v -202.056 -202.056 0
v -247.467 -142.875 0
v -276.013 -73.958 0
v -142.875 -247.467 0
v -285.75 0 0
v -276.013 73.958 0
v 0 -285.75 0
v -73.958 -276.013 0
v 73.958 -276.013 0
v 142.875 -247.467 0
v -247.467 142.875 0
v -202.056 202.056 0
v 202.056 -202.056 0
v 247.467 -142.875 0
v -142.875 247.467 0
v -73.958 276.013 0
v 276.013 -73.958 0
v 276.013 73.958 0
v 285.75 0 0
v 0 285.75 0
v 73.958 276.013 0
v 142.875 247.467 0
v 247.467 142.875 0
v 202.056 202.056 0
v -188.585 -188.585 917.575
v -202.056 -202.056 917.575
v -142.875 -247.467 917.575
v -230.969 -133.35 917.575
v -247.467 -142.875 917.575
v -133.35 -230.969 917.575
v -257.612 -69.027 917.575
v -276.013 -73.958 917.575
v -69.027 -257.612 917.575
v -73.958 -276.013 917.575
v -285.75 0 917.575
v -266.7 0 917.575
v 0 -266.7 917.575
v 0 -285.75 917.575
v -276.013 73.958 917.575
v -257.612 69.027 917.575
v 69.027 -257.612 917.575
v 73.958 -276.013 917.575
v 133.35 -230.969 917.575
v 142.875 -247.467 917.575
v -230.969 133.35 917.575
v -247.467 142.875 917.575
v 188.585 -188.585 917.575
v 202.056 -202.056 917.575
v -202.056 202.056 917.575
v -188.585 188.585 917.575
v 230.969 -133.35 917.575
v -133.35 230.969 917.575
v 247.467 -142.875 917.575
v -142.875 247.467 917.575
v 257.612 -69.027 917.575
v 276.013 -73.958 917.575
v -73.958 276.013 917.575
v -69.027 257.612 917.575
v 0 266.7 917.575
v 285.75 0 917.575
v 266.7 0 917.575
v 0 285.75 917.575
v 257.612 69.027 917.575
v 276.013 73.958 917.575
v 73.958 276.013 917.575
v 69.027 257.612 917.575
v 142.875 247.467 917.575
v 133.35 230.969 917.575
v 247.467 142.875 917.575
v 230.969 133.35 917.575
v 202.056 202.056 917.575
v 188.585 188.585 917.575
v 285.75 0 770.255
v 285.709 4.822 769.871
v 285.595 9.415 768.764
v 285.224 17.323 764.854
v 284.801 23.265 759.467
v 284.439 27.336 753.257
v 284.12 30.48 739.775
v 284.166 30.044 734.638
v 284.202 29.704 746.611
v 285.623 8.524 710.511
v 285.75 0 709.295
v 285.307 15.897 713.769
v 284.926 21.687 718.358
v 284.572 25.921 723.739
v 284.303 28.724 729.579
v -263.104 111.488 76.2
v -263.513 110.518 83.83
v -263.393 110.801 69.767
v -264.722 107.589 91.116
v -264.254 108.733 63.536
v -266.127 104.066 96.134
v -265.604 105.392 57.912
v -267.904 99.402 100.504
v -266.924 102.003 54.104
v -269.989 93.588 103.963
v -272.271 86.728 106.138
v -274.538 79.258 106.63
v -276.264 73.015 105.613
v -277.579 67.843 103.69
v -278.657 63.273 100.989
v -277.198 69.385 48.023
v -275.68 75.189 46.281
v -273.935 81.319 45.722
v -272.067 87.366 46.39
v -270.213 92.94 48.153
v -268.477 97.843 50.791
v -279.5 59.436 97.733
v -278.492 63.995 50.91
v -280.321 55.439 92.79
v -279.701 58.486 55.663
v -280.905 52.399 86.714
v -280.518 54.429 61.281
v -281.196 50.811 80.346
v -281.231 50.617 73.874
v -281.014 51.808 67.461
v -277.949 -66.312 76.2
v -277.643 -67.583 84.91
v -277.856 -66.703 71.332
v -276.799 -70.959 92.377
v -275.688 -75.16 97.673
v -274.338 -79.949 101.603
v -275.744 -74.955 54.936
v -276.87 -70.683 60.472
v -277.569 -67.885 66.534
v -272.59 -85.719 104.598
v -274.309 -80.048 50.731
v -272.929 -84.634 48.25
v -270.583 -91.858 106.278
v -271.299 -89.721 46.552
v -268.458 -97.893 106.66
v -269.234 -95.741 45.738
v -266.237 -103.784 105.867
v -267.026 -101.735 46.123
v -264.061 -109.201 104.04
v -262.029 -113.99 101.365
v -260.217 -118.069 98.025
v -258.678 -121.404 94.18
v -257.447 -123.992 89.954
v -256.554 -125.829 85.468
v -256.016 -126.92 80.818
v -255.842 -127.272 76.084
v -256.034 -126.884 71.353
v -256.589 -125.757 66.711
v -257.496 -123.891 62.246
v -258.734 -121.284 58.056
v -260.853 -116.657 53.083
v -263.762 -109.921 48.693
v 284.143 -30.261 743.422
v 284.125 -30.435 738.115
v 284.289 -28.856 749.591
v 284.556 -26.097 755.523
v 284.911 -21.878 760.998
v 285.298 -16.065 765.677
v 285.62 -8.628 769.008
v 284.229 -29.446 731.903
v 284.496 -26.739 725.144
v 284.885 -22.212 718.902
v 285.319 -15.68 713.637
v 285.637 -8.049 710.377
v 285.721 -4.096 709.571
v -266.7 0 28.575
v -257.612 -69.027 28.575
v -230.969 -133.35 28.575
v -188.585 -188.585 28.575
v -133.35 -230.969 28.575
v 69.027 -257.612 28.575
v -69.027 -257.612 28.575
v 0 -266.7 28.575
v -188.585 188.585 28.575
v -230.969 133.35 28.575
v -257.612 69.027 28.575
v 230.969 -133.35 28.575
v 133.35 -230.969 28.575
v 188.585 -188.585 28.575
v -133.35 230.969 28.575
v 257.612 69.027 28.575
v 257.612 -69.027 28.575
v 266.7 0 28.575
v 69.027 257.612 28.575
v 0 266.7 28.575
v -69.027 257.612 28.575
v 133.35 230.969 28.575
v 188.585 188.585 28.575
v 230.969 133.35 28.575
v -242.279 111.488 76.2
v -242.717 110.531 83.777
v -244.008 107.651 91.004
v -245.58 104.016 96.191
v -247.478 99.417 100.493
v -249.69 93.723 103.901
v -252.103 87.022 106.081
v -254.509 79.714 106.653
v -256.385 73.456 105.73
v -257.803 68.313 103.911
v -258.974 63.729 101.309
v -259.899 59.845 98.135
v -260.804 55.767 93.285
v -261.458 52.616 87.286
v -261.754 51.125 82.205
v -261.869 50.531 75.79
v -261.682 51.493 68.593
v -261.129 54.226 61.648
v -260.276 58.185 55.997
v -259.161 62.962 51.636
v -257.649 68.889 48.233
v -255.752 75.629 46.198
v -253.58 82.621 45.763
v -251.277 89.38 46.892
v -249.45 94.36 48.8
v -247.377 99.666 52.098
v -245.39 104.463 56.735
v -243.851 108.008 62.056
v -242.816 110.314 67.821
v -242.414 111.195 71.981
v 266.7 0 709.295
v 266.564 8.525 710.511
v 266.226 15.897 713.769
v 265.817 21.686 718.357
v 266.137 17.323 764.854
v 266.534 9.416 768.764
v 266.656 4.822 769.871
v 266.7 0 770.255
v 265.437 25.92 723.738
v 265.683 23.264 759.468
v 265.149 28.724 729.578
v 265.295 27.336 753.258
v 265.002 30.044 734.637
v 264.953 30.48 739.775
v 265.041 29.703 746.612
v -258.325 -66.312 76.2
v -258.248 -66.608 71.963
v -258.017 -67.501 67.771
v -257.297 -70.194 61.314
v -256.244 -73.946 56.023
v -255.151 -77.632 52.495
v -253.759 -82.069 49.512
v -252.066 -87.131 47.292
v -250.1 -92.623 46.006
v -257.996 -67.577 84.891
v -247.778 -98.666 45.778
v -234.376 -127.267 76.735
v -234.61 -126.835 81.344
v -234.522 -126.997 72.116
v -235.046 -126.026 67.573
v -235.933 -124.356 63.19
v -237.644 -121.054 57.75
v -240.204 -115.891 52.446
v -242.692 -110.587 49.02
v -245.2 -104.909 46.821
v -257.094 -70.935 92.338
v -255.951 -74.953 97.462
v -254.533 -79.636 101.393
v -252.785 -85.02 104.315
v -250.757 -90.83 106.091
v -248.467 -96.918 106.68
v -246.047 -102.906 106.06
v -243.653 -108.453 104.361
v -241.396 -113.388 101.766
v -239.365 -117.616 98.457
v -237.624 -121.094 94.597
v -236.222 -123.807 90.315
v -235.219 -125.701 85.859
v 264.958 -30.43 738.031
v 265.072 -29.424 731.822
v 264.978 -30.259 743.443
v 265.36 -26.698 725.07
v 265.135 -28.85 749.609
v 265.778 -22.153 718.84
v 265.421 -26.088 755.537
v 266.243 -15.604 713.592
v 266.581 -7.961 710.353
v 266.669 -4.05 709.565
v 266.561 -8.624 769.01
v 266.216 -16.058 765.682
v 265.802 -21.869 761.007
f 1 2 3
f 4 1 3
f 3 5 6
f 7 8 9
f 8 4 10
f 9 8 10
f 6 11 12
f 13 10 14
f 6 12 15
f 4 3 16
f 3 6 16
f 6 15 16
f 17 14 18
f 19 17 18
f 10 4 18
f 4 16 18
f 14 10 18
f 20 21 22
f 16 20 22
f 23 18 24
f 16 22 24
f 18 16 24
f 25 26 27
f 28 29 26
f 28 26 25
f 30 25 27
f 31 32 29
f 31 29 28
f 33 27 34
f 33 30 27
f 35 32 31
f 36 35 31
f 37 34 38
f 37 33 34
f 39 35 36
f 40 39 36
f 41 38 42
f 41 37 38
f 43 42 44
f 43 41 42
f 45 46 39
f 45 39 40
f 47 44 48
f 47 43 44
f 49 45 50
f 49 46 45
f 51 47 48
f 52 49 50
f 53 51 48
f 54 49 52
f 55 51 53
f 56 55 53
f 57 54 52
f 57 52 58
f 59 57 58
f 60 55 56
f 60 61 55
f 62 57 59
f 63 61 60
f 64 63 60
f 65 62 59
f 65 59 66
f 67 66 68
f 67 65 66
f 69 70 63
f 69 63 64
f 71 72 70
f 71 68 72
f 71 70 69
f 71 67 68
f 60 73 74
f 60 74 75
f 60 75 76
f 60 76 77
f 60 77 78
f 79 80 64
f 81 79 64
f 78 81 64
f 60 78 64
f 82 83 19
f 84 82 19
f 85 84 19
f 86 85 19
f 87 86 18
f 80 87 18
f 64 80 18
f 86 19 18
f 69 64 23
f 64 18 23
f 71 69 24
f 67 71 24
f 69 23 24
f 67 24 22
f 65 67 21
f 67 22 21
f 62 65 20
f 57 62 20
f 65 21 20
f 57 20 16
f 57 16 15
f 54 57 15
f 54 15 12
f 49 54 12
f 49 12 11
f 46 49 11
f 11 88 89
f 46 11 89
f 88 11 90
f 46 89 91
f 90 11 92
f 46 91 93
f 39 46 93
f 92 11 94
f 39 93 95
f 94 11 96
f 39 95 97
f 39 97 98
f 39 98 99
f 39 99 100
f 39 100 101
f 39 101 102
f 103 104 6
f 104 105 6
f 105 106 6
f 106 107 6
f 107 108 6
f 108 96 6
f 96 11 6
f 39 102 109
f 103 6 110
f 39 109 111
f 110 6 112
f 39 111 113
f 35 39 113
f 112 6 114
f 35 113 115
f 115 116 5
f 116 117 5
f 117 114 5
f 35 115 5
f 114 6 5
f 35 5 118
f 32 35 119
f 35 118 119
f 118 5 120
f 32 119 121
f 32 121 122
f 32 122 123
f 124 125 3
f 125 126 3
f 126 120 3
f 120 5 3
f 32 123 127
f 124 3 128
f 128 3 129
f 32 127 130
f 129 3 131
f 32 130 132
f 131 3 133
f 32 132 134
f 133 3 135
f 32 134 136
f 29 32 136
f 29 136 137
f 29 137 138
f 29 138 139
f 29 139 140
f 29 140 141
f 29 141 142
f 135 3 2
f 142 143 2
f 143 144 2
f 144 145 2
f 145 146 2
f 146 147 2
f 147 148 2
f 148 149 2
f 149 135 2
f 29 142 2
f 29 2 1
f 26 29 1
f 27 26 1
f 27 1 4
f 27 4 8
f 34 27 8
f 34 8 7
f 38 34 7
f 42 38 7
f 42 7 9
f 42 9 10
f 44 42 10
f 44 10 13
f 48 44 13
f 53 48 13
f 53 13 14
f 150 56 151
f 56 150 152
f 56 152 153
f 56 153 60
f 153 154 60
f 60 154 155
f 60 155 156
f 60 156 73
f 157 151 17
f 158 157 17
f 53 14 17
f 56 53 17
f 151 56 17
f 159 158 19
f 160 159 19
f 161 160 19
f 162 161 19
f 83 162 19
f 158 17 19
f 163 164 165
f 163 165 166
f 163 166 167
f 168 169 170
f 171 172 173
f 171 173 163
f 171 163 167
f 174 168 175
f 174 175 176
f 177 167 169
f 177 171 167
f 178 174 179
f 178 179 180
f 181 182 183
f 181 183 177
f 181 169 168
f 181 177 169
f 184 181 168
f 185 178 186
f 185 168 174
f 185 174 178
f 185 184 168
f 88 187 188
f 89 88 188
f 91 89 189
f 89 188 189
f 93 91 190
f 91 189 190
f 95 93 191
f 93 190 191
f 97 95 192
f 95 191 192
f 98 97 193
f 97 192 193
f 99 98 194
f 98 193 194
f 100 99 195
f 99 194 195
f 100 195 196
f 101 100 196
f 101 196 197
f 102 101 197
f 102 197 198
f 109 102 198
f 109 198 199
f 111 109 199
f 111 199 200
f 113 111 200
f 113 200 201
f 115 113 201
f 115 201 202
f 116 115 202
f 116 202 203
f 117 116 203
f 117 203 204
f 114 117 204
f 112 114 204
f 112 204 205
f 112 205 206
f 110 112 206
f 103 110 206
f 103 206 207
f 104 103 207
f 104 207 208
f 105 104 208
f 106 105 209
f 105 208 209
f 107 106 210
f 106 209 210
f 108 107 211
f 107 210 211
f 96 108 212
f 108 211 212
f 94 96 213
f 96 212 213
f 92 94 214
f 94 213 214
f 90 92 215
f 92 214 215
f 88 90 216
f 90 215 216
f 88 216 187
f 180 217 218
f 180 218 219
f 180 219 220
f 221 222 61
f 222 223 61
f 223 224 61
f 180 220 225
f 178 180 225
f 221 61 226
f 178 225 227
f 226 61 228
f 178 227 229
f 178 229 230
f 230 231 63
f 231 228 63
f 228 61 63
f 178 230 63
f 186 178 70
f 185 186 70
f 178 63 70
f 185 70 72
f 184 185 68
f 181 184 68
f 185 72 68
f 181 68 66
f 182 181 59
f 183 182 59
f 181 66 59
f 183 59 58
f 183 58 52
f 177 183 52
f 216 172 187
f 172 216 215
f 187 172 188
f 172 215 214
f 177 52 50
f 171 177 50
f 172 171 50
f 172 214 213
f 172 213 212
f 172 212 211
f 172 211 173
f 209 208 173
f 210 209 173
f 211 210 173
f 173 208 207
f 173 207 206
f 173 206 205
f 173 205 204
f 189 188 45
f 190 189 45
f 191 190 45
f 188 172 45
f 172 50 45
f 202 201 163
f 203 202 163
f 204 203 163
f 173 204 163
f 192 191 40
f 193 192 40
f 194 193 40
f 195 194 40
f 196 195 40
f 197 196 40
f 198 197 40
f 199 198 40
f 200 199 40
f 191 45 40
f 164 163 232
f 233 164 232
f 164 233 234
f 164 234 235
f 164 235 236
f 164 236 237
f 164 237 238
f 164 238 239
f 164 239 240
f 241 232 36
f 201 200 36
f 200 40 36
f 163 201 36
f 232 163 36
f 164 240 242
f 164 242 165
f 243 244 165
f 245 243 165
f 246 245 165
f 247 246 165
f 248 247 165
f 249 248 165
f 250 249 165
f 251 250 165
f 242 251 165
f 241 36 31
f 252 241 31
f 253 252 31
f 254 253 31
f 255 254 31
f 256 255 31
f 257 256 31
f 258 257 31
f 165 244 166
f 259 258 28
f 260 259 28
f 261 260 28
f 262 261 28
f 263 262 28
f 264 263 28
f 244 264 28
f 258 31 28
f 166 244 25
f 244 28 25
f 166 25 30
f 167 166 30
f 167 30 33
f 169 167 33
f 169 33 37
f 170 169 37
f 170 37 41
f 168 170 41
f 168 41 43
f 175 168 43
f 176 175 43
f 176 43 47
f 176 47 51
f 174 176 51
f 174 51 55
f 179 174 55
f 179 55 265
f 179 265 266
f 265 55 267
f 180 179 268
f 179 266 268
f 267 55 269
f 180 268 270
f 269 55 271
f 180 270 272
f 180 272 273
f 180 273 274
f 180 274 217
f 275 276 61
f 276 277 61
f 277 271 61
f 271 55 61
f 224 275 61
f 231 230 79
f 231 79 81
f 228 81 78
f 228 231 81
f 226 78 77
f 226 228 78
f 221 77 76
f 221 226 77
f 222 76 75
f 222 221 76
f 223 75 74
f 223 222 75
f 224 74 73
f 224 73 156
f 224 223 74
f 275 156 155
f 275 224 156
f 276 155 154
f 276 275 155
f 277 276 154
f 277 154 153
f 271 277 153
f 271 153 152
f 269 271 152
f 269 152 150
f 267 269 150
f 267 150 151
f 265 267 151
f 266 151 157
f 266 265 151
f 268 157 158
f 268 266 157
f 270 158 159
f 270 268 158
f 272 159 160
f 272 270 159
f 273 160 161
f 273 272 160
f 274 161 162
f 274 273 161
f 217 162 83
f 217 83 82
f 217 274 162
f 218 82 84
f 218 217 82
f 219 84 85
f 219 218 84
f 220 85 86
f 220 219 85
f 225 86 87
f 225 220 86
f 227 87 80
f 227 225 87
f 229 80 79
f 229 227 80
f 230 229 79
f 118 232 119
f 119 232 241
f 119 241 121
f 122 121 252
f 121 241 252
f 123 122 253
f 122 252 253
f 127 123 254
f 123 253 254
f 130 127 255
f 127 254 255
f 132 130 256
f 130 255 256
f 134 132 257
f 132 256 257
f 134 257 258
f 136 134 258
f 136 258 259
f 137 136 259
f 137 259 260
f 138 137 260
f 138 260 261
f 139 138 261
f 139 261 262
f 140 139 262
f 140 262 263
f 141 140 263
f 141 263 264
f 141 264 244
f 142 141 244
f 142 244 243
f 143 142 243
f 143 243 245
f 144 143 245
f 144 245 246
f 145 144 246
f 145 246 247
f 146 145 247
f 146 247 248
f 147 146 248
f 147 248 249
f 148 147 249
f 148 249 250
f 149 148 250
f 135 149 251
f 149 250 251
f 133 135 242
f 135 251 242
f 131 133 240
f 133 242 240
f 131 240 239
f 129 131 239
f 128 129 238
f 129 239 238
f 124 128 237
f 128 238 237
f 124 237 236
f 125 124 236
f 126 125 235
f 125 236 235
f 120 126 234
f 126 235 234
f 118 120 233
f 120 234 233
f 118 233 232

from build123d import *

# Parameters (mm, degrees)
F0_R     = 285.75
F1_DEPTH = 917.575
F2_R     = 266.7
F3_DEPTH = 889
F4_R     = 30.48
F5_DEPTH = 547.83055
F6_R     = 30.48
F7_DEPTH = 651.82147


with BuildPart() as f1:
    # F0 (on Top) → F1 (new body)
    with BuildSketch(Plane.XY):
        Circle(F0_R)
    extrude(amount=F1_DEPTH)

    # F2 (on face) → F3 (cut)
    with BuildSketch(Plane.XY.offset(917.575)):
        Circle(F2_R)
    extrude(amount=-F3_DEPTH, mode=Mode.SUBTRACT)

    # F4 (on Right) → F5 (cut)
    with BuildSketch(Plane.YZ):
        with Locations((0, 739.775)):
            Circle(F4_R)
    extrude(amount=F5_DEPTH, mode=Mode.SUBTRACT)

    # F6 (on Right) → F7 (cut)
    with BuildSketch(Plane.YZ):
        with Locations((81.008007, 76.2)):
            Circle(F6_R)
        with Locations((-96.791993, 76.2)):
            Circle(F6_R)
    extrude(amount=-F7_DEPTH, mode=Mode.SUBTRACT)


solid = f1.part
